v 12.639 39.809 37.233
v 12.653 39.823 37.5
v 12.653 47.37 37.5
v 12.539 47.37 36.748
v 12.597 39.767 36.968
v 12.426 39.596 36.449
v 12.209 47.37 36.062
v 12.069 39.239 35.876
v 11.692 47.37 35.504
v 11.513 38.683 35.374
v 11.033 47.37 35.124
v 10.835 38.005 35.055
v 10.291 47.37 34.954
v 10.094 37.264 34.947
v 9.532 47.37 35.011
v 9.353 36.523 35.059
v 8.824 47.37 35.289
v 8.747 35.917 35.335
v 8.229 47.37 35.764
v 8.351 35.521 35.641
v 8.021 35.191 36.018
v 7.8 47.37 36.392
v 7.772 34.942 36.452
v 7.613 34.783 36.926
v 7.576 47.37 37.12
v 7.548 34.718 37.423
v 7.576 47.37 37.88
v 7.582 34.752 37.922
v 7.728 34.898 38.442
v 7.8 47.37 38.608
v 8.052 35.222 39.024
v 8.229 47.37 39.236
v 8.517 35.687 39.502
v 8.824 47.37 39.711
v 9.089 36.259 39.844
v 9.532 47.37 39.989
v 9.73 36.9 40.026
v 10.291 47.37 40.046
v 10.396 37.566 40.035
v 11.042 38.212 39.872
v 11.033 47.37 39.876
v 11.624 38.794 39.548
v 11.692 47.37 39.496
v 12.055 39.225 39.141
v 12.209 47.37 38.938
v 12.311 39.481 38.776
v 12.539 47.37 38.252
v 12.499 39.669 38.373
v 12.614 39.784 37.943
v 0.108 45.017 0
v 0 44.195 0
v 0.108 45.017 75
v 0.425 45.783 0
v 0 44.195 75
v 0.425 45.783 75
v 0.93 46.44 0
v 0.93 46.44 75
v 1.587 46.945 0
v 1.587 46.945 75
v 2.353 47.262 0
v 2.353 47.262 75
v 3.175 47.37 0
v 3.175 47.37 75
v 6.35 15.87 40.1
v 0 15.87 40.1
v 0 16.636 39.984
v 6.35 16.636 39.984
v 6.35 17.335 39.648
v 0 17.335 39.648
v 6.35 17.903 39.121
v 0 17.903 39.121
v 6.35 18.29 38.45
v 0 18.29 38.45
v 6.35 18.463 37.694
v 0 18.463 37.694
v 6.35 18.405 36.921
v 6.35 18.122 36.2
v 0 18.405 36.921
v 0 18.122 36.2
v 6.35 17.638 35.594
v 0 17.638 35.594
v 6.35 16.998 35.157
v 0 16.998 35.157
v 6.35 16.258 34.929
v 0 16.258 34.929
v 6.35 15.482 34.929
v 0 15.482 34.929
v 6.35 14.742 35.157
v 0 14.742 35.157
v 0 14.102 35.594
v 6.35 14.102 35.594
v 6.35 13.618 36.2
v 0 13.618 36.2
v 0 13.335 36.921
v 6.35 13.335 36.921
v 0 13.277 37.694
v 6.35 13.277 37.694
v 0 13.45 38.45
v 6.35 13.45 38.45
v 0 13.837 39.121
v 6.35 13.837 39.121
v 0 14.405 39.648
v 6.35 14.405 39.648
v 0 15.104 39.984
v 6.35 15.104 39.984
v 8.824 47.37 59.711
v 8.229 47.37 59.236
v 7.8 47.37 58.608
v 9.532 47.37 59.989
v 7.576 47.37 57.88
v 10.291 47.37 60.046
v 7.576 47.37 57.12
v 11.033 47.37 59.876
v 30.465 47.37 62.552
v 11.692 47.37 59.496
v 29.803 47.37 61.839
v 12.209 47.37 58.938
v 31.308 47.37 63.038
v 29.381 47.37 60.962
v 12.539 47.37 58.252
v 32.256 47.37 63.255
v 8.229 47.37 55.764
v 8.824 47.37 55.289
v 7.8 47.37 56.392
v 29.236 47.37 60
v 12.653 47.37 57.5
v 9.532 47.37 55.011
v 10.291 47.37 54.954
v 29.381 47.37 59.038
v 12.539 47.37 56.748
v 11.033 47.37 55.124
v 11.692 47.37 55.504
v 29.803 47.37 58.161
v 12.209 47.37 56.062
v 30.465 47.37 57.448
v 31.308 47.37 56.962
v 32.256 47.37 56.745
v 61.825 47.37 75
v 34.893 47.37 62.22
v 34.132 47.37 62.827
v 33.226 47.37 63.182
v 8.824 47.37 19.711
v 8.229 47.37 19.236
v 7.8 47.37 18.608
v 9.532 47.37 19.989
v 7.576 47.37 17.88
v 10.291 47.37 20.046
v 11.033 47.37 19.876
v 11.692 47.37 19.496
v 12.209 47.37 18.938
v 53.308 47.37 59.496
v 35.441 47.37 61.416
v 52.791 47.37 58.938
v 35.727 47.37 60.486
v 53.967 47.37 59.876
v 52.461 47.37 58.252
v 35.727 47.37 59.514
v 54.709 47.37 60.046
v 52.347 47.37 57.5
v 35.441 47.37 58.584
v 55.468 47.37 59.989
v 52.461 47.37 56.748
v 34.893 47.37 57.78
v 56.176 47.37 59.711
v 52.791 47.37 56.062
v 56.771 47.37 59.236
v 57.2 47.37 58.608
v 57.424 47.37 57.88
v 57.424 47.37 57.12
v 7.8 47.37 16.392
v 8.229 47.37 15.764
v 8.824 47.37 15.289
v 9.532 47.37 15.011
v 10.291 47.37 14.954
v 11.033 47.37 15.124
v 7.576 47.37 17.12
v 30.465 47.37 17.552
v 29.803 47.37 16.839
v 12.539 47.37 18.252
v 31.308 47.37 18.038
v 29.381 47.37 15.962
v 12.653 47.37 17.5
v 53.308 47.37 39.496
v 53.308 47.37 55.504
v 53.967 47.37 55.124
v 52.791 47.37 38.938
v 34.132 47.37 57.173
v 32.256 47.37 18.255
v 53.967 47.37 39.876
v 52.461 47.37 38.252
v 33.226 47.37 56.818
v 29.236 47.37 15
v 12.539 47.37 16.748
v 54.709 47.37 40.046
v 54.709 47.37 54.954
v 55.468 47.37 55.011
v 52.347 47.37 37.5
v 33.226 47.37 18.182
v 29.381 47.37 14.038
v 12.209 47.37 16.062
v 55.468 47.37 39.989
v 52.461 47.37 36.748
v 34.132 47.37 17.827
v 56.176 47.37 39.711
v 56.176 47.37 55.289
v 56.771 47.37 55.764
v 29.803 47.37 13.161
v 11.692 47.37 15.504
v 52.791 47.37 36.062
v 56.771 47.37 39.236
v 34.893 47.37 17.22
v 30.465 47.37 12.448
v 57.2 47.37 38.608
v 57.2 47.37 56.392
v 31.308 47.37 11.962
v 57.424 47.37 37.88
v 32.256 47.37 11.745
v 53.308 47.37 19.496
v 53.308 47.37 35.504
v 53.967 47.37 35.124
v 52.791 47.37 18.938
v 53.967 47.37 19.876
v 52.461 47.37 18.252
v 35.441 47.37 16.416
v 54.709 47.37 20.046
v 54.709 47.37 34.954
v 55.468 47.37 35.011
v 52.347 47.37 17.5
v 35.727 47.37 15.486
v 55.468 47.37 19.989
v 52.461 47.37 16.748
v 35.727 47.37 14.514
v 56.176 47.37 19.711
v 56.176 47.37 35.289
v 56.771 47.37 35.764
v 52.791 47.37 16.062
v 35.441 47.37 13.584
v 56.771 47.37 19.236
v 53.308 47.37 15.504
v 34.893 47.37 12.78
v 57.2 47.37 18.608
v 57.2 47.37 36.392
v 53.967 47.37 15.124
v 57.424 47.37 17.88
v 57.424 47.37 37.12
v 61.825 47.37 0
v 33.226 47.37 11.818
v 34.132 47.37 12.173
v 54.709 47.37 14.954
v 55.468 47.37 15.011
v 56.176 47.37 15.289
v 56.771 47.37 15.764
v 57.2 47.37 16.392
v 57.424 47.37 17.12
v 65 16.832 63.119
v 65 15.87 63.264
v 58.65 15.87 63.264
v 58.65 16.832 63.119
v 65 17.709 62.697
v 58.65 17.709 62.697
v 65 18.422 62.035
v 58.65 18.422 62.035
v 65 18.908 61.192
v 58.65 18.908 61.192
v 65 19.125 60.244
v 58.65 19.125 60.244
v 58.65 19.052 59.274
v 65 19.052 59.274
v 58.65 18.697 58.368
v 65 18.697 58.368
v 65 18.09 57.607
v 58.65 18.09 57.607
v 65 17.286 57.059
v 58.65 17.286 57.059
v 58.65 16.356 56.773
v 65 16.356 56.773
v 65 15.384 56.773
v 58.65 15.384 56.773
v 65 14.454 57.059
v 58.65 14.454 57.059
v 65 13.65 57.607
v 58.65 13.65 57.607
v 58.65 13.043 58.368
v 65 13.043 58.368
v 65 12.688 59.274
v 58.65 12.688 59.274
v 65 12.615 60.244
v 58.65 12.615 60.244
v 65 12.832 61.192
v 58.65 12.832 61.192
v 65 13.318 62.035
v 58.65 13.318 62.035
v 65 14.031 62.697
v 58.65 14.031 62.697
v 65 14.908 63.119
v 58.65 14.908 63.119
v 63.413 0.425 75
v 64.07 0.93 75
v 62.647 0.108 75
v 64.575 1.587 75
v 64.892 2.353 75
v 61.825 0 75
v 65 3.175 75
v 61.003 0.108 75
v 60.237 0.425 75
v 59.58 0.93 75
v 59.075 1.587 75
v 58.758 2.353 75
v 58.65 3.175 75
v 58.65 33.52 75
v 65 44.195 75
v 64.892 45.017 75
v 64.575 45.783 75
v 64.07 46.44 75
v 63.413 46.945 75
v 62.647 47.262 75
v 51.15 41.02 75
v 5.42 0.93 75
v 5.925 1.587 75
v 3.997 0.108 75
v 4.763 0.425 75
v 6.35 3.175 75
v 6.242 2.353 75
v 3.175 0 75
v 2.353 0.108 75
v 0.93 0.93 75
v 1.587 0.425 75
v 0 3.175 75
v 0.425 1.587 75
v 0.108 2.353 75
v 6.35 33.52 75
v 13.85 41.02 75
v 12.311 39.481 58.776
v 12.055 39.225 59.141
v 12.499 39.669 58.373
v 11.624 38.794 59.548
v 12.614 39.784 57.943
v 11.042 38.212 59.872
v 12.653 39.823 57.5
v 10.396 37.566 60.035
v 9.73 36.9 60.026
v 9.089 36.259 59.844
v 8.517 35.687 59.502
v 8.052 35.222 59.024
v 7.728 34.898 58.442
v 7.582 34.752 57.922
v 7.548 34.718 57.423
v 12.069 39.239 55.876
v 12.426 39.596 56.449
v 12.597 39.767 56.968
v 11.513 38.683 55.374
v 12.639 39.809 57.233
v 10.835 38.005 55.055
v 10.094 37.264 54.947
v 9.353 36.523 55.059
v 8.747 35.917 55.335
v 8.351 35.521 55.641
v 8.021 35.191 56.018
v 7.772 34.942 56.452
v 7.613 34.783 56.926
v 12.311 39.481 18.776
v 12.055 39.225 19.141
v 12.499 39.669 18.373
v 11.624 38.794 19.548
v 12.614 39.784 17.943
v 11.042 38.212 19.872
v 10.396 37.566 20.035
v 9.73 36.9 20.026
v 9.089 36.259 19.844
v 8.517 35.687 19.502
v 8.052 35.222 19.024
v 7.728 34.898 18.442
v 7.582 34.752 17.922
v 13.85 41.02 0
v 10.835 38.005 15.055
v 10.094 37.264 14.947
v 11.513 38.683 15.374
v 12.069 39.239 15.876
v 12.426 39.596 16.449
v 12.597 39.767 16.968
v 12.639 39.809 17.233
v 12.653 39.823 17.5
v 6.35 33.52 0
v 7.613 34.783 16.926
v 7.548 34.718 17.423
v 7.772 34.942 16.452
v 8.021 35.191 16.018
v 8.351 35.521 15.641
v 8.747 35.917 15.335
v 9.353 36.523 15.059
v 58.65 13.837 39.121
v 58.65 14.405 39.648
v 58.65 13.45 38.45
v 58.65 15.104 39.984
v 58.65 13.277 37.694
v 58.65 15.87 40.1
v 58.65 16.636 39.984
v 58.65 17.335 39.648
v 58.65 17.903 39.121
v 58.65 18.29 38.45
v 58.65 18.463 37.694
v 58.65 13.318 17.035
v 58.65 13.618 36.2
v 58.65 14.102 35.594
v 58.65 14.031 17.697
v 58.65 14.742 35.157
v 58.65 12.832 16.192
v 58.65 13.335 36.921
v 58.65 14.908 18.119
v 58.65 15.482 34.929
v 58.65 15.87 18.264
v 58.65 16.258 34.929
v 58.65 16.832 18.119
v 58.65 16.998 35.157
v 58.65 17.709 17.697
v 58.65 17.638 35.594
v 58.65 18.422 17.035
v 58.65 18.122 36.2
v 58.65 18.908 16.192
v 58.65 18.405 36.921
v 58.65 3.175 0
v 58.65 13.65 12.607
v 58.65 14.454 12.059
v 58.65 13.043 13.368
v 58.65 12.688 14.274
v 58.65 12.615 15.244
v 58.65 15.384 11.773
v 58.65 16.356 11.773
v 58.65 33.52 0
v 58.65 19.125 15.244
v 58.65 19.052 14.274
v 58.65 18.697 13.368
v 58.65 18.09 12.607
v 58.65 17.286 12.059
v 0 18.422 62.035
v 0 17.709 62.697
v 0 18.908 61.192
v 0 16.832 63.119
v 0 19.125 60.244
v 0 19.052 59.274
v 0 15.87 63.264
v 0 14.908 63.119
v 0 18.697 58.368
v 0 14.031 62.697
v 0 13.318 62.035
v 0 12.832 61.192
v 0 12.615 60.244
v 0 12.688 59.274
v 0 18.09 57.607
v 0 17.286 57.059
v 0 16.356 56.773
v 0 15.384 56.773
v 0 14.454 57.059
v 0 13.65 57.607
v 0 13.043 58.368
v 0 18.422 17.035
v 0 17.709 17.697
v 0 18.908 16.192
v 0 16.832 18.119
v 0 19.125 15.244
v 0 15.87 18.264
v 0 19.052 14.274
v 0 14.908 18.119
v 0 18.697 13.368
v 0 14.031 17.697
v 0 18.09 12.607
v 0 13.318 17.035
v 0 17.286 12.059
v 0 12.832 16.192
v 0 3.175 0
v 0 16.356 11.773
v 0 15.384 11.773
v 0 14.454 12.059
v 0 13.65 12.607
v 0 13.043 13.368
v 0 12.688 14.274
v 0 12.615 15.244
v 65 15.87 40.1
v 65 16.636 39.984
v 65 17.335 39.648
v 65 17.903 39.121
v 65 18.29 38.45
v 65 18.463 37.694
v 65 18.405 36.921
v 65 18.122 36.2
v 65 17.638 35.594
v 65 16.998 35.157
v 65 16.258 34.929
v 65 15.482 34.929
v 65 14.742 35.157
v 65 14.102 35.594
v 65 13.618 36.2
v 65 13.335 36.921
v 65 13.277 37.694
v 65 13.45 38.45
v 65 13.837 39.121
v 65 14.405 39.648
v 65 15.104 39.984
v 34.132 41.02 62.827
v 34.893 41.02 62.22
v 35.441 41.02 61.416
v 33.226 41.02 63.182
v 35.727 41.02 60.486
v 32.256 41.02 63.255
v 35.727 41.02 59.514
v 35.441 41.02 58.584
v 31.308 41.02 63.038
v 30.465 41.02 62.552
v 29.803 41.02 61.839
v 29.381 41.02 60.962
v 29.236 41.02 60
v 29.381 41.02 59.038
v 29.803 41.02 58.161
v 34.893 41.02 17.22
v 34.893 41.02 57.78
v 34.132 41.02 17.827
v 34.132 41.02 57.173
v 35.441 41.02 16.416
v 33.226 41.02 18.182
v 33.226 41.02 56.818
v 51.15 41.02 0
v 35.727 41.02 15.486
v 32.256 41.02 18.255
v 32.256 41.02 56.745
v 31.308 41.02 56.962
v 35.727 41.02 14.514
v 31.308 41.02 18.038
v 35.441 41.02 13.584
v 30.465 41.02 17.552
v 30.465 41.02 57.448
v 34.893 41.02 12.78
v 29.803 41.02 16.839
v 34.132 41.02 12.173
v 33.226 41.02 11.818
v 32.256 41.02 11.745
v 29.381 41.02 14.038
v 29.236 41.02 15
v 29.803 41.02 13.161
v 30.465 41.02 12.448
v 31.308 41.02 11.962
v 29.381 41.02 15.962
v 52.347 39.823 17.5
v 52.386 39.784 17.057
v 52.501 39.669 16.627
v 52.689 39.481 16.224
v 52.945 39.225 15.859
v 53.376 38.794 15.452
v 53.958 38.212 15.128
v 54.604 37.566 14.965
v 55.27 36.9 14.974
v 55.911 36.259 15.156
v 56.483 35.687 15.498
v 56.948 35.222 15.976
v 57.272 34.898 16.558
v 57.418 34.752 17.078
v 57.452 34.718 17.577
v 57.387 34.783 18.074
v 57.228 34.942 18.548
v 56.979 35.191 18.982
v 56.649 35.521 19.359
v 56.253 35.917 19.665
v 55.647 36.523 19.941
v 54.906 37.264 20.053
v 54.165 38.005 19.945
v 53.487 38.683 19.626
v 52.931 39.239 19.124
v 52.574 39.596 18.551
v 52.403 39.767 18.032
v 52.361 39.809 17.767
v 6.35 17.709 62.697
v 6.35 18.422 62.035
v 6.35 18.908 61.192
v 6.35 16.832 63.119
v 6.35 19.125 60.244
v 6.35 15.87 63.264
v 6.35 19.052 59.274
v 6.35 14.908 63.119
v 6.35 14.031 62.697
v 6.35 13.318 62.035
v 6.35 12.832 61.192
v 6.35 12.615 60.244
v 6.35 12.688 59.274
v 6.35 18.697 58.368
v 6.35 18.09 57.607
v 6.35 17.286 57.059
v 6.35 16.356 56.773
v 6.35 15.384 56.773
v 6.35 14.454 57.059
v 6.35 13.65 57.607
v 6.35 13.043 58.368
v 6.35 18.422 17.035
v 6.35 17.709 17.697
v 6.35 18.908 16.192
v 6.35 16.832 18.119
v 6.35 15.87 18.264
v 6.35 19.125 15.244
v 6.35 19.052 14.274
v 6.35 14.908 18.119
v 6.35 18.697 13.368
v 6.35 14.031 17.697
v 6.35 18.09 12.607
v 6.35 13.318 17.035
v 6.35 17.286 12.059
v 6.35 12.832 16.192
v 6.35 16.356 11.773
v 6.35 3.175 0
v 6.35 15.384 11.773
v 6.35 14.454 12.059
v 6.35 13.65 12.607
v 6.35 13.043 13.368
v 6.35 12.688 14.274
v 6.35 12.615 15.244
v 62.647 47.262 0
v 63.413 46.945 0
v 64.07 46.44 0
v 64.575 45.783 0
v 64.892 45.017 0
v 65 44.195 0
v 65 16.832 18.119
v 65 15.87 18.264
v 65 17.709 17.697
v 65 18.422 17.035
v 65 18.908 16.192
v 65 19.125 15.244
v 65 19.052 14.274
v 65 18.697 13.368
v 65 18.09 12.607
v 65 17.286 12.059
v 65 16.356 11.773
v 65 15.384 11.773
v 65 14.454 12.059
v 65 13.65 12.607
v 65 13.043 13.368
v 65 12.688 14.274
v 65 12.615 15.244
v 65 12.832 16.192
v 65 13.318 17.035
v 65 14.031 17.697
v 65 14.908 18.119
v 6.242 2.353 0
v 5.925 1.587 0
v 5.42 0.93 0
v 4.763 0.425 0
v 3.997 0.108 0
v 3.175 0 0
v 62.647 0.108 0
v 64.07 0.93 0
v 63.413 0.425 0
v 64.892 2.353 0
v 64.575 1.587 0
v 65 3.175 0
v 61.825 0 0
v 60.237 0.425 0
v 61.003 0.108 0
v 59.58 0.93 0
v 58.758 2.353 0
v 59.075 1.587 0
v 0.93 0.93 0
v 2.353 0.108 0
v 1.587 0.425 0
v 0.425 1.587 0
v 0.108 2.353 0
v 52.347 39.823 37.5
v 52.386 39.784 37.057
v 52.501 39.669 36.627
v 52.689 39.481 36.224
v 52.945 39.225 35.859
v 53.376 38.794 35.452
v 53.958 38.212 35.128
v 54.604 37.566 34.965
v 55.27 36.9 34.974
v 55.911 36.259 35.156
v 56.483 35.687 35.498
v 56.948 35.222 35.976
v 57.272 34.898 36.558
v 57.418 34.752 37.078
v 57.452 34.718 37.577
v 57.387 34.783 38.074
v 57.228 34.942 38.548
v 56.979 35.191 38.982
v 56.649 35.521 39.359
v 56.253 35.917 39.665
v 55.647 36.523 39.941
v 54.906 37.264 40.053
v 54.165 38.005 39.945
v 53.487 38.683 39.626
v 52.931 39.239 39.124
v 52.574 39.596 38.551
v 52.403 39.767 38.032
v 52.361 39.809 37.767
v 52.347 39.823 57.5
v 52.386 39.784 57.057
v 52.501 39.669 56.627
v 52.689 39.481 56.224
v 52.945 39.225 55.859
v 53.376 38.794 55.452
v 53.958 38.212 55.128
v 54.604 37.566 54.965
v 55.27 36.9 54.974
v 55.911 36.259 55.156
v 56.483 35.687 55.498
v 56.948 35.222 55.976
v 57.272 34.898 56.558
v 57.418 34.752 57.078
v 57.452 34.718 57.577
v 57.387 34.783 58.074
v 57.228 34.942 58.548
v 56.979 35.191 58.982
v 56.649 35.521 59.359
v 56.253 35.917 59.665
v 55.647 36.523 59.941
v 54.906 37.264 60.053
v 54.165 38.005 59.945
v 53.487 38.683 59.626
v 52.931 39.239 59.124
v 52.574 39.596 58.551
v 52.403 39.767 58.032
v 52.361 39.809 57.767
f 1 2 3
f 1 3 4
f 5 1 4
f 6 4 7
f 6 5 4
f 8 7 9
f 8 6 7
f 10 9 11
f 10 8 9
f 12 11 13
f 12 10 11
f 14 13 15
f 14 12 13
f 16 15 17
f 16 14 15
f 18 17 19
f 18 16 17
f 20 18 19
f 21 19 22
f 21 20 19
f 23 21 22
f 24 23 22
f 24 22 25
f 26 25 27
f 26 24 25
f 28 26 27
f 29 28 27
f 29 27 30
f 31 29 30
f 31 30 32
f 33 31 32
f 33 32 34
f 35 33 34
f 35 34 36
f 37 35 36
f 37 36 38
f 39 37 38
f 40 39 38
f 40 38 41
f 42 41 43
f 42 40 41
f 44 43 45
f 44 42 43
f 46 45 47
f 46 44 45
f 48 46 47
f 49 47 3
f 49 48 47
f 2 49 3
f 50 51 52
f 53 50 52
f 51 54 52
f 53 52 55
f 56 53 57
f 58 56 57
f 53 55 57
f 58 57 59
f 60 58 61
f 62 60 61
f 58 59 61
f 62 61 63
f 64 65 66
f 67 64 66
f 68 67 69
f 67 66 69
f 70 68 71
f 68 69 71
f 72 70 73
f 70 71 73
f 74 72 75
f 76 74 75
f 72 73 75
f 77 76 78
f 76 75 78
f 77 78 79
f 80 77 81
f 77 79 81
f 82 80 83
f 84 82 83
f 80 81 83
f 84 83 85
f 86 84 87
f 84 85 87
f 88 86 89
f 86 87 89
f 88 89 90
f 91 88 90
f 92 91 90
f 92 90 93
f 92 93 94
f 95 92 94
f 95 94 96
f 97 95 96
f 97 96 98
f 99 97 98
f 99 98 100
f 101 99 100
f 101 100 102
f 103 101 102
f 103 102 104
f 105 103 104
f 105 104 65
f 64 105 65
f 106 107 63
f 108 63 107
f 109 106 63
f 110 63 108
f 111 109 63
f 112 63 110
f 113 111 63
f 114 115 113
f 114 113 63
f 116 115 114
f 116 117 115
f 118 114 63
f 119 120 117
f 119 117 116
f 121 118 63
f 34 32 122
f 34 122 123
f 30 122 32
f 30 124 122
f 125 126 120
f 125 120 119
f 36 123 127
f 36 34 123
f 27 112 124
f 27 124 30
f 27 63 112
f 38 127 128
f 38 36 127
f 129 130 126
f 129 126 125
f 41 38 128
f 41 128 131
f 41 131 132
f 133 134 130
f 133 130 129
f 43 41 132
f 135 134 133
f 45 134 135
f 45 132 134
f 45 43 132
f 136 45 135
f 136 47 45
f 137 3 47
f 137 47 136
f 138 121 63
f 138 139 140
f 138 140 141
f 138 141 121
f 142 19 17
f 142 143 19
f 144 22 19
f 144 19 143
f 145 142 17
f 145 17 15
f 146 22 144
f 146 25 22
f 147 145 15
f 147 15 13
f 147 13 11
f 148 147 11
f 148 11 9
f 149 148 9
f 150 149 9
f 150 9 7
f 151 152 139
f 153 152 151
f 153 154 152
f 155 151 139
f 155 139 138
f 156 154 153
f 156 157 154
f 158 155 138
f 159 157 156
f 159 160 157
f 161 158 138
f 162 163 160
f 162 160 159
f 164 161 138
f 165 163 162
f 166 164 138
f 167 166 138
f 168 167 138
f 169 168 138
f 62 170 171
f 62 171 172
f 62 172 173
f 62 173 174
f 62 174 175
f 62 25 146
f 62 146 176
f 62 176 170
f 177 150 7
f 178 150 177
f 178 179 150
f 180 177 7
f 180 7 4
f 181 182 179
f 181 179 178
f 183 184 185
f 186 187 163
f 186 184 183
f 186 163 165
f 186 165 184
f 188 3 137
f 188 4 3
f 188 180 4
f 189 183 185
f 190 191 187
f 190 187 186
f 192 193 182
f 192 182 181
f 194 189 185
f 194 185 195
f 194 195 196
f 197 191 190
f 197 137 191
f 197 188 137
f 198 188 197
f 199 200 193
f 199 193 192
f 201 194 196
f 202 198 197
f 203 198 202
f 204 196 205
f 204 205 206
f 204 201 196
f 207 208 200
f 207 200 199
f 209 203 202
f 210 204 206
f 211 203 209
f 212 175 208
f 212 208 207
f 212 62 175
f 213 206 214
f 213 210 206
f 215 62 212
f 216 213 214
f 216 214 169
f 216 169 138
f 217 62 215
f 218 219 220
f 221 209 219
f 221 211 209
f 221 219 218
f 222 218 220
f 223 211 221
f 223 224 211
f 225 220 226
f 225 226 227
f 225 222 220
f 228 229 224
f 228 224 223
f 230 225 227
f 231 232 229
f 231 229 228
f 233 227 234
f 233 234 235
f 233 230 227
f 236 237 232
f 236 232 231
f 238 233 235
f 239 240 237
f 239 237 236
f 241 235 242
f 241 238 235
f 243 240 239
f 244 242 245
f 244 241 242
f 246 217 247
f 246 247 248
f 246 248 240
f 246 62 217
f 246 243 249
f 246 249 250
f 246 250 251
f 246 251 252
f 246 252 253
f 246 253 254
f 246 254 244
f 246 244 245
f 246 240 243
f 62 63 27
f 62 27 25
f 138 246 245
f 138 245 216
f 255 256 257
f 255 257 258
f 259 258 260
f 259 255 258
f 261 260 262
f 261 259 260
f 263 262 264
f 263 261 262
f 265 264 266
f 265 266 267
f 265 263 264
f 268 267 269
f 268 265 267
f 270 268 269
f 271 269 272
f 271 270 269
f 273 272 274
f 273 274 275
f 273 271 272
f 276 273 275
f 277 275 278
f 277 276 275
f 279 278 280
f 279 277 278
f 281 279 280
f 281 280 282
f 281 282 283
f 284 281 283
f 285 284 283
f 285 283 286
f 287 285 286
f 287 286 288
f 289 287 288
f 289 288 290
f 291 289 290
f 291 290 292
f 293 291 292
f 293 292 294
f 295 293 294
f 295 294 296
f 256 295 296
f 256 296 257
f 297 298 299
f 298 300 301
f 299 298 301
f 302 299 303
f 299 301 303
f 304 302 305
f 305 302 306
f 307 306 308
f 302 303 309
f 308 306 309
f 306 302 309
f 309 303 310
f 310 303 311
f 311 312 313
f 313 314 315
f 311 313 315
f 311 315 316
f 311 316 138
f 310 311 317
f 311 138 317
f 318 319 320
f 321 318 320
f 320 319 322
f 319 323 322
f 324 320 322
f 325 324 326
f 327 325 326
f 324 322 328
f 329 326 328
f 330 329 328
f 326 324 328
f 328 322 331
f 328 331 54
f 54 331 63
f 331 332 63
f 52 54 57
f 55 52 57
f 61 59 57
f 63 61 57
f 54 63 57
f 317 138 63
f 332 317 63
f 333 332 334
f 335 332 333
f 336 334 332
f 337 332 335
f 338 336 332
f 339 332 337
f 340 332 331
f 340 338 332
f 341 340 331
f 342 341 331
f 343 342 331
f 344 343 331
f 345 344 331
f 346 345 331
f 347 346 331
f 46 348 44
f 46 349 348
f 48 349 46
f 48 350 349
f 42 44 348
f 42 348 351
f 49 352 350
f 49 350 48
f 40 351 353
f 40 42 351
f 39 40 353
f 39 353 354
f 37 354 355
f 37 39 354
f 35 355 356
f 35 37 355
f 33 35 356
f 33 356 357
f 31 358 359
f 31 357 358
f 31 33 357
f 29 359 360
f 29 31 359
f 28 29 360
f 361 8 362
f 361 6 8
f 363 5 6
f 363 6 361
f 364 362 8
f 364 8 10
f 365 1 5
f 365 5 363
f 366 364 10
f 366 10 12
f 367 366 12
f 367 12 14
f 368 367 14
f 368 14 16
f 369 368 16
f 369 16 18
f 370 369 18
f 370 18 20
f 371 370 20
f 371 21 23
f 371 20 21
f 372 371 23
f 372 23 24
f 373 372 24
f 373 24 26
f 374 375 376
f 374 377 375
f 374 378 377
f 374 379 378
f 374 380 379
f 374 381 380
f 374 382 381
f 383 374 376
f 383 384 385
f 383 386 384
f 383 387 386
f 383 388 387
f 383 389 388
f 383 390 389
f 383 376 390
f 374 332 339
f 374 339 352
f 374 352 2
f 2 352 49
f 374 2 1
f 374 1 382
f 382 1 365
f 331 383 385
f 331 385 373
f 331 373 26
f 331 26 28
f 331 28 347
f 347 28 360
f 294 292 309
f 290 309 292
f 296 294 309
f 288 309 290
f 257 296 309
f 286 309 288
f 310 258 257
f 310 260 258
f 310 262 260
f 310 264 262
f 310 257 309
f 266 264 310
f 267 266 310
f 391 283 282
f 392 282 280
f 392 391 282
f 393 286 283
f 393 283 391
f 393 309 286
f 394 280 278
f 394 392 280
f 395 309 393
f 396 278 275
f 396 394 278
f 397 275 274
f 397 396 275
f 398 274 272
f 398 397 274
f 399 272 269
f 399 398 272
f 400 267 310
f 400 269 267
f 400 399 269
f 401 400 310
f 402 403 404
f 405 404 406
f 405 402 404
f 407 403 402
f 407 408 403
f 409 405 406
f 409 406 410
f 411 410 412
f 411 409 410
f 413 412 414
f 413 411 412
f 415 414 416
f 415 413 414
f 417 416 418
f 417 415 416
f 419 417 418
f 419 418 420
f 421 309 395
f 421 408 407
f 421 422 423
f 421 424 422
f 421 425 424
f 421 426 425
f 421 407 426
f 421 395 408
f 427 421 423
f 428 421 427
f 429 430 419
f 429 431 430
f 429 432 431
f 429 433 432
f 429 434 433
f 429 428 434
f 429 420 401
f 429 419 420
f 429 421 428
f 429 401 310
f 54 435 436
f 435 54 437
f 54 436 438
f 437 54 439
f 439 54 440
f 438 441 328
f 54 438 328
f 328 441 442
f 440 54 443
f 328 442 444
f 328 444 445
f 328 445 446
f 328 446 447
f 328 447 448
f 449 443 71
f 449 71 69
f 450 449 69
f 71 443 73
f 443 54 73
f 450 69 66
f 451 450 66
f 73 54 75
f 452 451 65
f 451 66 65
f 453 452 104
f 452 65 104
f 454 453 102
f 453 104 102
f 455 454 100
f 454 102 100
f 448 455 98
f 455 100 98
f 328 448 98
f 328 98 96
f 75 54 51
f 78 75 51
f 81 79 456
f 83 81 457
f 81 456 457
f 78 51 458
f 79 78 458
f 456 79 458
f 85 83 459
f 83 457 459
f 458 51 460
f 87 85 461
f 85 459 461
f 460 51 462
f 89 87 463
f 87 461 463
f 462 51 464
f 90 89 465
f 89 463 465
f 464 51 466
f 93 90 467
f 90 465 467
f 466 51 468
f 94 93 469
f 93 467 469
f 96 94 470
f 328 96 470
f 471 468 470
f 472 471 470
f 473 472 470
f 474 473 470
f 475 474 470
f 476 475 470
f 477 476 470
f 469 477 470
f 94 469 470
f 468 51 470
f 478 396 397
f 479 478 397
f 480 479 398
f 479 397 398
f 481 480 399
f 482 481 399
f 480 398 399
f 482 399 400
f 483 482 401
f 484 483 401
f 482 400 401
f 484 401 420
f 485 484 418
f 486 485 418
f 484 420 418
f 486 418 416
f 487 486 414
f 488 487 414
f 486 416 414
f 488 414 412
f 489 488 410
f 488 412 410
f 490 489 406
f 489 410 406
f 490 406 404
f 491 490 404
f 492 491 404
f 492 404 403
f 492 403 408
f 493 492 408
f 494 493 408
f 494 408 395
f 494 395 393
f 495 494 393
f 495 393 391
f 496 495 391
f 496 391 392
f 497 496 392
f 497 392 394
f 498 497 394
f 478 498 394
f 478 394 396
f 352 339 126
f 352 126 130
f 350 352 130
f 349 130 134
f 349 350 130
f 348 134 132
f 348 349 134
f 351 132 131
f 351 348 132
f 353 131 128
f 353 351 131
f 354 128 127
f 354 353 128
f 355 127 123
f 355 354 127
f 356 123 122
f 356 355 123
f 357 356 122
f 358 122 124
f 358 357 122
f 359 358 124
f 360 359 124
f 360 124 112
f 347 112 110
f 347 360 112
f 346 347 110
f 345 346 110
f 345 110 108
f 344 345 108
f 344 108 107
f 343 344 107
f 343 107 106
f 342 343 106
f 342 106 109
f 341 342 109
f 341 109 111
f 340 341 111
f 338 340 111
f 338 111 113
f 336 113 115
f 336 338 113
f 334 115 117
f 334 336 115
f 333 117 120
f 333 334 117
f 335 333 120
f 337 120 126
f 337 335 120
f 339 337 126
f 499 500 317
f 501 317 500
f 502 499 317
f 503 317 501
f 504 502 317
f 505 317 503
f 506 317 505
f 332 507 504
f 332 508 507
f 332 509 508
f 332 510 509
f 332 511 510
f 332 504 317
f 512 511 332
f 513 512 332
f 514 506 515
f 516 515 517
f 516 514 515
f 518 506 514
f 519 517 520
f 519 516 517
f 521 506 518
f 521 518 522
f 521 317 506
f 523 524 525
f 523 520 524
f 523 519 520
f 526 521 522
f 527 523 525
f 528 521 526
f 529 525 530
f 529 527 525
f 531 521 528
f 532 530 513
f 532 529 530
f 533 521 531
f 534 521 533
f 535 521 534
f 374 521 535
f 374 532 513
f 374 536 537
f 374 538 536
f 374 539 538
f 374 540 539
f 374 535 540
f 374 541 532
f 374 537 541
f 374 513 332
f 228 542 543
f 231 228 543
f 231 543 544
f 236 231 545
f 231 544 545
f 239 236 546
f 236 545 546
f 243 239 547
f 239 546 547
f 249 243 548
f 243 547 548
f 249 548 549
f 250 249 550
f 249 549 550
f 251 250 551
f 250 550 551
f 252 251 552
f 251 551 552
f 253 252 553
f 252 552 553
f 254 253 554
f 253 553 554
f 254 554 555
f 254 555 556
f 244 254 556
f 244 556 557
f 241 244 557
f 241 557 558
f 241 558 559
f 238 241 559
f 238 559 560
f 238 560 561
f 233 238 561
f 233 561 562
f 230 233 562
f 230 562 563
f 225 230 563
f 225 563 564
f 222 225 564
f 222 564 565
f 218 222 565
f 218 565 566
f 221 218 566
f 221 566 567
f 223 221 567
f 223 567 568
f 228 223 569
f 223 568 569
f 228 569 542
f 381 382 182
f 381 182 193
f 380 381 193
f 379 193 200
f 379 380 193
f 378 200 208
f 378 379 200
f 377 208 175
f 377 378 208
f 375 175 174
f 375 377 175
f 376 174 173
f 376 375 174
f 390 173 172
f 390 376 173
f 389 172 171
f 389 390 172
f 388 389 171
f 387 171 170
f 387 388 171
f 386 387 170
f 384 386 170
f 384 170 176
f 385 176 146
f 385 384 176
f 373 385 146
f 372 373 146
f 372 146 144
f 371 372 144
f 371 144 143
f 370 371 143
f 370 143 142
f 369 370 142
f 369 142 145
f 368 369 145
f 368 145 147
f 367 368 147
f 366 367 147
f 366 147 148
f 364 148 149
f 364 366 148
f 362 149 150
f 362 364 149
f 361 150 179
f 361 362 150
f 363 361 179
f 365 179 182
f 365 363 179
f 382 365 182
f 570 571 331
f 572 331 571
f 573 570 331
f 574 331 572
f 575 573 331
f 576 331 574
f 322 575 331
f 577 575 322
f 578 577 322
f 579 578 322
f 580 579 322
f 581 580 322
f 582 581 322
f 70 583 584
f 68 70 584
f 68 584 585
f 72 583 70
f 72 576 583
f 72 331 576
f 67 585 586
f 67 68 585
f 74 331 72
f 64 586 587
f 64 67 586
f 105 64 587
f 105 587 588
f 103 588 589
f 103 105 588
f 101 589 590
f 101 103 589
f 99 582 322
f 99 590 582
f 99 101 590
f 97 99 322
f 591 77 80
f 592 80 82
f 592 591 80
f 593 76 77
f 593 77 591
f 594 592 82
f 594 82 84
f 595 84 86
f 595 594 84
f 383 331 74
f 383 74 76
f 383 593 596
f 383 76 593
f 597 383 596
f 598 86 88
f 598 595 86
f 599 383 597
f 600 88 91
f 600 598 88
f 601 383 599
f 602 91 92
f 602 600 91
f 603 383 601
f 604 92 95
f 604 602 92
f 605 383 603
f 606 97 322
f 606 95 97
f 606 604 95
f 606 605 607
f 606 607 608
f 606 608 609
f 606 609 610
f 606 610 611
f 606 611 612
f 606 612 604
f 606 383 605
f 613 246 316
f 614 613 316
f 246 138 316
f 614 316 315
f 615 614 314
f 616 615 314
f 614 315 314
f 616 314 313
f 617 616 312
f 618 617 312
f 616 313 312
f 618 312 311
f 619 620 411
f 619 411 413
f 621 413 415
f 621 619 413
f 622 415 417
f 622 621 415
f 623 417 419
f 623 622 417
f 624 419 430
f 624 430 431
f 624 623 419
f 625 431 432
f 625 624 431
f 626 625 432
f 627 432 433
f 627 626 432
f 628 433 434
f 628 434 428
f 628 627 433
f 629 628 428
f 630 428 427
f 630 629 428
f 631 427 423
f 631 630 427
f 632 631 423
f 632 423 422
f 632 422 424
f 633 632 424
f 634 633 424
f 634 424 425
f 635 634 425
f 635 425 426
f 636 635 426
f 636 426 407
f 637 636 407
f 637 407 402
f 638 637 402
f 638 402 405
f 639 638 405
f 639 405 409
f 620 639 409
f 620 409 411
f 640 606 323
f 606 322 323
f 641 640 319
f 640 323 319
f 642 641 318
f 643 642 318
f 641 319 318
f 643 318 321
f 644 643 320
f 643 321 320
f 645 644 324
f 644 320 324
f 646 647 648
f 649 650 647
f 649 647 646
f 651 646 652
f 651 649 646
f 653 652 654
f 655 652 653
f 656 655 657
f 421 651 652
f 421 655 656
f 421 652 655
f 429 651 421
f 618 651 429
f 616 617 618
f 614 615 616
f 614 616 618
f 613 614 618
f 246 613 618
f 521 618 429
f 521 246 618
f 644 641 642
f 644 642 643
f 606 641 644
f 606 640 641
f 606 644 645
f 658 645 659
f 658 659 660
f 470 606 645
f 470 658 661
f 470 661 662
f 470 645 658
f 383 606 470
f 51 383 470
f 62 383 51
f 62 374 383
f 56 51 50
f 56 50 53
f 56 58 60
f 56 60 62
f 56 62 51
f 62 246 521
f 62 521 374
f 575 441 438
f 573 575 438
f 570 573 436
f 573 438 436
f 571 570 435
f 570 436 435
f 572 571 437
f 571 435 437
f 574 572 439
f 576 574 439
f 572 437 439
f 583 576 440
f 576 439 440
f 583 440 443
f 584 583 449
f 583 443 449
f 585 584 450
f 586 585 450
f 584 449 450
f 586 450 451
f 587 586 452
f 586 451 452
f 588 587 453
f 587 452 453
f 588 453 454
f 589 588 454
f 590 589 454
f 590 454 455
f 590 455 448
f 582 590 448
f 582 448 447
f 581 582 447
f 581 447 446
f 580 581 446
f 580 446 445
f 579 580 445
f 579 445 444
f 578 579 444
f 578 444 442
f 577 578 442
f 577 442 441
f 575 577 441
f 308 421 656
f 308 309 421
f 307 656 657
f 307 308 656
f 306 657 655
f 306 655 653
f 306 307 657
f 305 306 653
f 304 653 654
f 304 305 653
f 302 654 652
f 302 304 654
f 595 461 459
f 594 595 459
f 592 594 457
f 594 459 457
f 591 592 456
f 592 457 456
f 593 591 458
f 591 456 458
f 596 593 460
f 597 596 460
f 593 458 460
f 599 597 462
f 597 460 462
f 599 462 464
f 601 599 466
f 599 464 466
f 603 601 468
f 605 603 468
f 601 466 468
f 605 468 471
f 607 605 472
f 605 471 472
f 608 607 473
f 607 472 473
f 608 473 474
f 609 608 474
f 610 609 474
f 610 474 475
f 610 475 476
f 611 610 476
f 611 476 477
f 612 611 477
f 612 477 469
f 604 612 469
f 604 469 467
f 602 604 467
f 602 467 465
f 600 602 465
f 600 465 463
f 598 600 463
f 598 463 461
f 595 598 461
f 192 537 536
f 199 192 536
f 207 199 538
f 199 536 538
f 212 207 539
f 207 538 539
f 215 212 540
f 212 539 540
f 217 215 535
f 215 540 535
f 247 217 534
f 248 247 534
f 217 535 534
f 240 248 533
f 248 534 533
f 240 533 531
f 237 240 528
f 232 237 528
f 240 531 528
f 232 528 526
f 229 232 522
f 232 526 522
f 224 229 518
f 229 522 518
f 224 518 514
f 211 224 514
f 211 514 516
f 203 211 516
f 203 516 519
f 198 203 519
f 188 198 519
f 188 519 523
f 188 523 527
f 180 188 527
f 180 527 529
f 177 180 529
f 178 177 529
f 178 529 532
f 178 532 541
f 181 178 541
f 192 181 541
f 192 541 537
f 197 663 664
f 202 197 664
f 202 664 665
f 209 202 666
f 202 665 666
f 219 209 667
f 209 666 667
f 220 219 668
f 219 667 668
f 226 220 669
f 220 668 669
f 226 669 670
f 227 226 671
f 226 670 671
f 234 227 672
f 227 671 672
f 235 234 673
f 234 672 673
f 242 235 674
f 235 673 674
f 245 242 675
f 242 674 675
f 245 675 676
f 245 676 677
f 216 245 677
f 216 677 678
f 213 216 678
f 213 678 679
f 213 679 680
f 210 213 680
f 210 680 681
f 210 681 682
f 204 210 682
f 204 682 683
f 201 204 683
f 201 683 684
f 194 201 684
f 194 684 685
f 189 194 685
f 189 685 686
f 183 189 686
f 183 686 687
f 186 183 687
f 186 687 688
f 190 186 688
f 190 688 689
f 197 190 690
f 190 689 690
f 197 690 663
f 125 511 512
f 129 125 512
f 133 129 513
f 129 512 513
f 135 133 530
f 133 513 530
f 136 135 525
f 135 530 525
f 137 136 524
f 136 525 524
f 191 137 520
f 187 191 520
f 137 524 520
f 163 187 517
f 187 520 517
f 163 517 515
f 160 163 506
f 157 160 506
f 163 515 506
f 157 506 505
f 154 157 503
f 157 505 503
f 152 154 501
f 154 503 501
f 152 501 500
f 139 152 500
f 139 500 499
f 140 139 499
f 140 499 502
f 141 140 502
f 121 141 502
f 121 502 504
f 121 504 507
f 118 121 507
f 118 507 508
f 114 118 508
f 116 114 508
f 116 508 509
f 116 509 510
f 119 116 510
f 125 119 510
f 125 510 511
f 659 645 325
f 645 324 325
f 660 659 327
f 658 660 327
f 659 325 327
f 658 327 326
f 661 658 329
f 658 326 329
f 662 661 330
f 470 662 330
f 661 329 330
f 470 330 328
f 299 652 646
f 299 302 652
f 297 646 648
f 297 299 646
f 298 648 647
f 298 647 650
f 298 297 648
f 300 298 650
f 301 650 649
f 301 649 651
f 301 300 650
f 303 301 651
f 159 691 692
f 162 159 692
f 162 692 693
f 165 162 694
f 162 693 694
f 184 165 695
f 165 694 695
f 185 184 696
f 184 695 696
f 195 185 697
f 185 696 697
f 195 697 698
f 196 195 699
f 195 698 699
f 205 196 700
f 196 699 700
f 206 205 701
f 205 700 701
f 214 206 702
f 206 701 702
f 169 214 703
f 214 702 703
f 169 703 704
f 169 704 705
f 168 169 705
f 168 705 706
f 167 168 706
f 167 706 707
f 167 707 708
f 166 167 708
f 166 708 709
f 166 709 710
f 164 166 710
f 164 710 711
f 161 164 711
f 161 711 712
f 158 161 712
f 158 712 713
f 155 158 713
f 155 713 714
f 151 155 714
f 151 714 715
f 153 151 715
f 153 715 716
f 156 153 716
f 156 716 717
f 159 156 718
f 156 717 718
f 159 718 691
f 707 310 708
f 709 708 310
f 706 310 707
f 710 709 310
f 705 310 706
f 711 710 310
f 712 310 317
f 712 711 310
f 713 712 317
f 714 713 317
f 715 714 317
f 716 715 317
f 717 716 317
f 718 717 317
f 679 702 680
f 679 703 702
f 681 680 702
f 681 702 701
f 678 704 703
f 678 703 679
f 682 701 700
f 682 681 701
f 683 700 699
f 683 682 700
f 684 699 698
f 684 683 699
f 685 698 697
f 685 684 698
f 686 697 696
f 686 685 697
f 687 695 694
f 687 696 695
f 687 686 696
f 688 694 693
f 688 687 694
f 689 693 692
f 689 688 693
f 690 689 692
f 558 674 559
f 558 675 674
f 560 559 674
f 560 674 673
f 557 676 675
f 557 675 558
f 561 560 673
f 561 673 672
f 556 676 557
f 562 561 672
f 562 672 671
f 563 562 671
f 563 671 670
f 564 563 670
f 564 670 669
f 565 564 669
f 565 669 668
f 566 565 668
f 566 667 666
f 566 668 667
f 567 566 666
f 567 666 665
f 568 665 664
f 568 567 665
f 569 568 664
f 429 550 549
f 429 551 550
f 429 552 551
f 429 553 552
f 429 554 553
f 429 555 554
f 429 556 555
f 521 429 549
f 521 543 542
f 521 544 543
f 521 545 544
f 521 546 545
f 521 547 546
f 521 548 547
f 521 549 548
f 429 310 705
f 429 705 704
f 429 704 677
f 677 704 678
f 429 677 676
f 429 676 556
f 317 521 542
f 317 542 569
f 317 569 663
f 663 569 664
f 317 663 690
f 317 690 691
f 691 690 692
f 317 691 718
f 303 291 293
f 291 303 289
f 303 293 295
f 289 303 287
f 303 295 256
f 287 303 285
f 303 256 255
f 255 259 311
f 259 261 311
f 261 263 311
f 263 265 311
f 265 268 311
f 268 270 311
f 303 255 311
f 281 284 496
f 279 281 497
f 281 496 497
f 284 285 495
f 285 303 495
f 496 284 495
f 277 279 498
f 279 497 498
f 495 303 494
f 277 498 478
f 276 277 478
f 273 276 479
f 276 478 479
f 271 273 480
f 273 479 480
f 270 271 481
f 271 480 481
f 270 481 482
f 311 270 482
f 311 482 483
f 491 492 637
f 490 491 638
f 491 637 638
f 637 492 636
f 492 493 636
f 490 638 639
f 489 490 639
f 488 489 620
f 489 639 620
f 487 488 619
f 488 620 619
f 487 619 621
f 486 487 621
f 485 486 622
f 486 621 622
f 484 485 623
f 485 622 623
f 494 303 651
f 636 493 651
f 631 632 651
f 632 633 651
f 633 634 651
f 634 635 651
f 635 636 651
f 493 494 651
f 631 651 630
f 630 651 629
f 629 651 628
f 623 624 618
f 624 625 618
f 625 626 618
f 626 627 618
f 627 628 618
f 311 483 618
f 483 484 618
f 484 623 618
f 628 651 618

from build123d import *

# Parameters (mm, degrees)
BOSS_EXTRUDE1_DEPTH           = 75
F_5_16_18_TAPPED_HOLE1_REACH  = 111.972
F_5_16_18_TAPPED_HOLE1_BORE_R = 3.2639
F_5_16_18_TAPPED_HOLE2_D      = 6.5278
SKETCH8_R                     = 2.6
CUT_EXTRUDE1_DEPTH            = 110.972346069
F_1_4_20_TAPPED_HOLE1_D       = 5.1054
F_1_4_20_TAPPED_HOLE1_DEPTH   = 13.851
FILLET1_R                     = 3.175


with BuildPart() as part:
    # Sketch1 → Boss-Extrude1 (new body)
    with BuildSketch(Plane.XY):
        Polygon((58.65, 33.52), (51.15, 41.02), (13.85, 41.02), (6.35, 33.52), (6.35, 0), (0, 0), (0, 41.02), (0, 47.37), (65, 47.37), (65, 41.02), (65, 0), (58.65, 0), align=None)
    extrude(amount=BOSS_EXTRUDE1_DEPTH)

    # 5/16-18 Tapped Hole1 bore → 5/16-18 Tapped Hole1 (cut, up to next)
    with BuildSketch(Plane.ZY, mode=Mode.PRIVATE) as f_5_16_18_tapped_hole1_sk1:
        with Locations((60, 15.87)):
            Circle(F_5_16_18_TAPPED_HOLE1_BORE_R)
    f_5_16_18_tapped_hole1_tool1 = extrude(f_5_16_18_tapped_hole1_sk1.sketch, amount=-F_5_16_18_TAPPED_HOLE1_REACH, mode=Mode.PRIVATE) & part.part
    # 5/16-18 Tapped Hole1 bore → 5/16-18 Tapped Hole1 (cut, up to next)
    with BuildSketch(Plane.ZY, mode=Mode.PRIVATE) as f_5_16_18_tapped_hole1_sk2:
        with Locations((15, 15.87)):
            Circle(F_5_16_18_TAPPED_HOLE1_BORE_R)
    f_5_16_18_tapped_hole1_tool2 = extrude(f_5_16_18_tapped_hole1_sk2.sketch, amount=-F_5_16_18_TAPPED_HOLE1_REACH, mode=Mode.PRIVATE) & part.part
    f_5_16_18_tapped_hole1_1 = f_5_16_18_tapped_hole1_tool1.solids().sort_by_distance((0, 15.87, 60))[0]
    add(f_5_16_18_tapped_hole1_1, mode=Mode.SUBTRACT)
    f_5_16_18_tapped_hole1_2 = f_5_16_18_tapped_hole1_tool2.solids().sort_by_distance((0, 15.87, 15))[0]
    add(f_5_16_18_tapped_hole1_2, mode=Mode.SUBTRACT)
    f_5_16_18_tapped_hole1 = f_5_16_18_tapped_hole1_1 + f_5_16_18_tapped_hole1_2  # 5/16-18 Tapped Hole1 as one shape, for the pattern or mirror that repeats it

    # Mirror1: 5/16-18 Tapped Hole1 across plane
    add(f_5_16_18_tapped_hole1.mirror(Plane.ZY.offset(-32.5)), mode=Mode.SUBTRACT)

    # 5/16-18 Tapped Hole2 (through all)
    with Locations(Plane(origin=(0, 47.37, 0), x_dir=(1, 0, 0), z_dir=(0, 1, 0))):
        with Locations((32.5, -15), (32.5, -60)):
            Hole(F_5_16_18_TAPPED_HOLE2_D / 2)

    # Sketch8 → Cut-Extrude1 (cut, through all)
    with BuildSketch(Plane.ZY):
        with Locations((37.5, 15.87)):
            Circle(SKETCH8_R)
    extrude(amount=-CUT_EXTRUDE1_DEPTH, mode=Mode.SUBTRACT)

    # 1/4-20 Tapped Hole1
    with Locations(Plane(origin=(0, 47.37, 0), x_dir=(1, 0, 0), z_dir=(0, 1, 0))):
        with Locations((54.9, -57.5), (54.9, -37.5), (54.9, -17.5)):
            f_1_4_20_tapped_hole1 = Hole(F_1_4_20_TAPPED_HOLE1_D / 2, depth=F_1_4_20_TAPPED_HOLE1_DEPTH)

    # Mirror2: 1/4-20 Tapped Hole1 across plane
    add(f_1_4_20_tapped_hole1.mirror(Plane.ZY.offset(-32.5)), mode=Mode.SUBTRACT)

    # Fillet1
    fillet1_edges = [part.edges().sort_by_distance(p)[0] for p in [
        (58.65, 0, 37.5),
        (65, 0, 37.5),
        (0, 0, 37.5),
        (6.35, 0, 37.5),
        (0, 47.37, 37.5),
        (65, 47.37, 37.5),
    ]]
    fillet(fillet1_edges, radius=FILLET1_R - 0.0001)  # a hair under: the kernel refuses the full size


solid = part.part
